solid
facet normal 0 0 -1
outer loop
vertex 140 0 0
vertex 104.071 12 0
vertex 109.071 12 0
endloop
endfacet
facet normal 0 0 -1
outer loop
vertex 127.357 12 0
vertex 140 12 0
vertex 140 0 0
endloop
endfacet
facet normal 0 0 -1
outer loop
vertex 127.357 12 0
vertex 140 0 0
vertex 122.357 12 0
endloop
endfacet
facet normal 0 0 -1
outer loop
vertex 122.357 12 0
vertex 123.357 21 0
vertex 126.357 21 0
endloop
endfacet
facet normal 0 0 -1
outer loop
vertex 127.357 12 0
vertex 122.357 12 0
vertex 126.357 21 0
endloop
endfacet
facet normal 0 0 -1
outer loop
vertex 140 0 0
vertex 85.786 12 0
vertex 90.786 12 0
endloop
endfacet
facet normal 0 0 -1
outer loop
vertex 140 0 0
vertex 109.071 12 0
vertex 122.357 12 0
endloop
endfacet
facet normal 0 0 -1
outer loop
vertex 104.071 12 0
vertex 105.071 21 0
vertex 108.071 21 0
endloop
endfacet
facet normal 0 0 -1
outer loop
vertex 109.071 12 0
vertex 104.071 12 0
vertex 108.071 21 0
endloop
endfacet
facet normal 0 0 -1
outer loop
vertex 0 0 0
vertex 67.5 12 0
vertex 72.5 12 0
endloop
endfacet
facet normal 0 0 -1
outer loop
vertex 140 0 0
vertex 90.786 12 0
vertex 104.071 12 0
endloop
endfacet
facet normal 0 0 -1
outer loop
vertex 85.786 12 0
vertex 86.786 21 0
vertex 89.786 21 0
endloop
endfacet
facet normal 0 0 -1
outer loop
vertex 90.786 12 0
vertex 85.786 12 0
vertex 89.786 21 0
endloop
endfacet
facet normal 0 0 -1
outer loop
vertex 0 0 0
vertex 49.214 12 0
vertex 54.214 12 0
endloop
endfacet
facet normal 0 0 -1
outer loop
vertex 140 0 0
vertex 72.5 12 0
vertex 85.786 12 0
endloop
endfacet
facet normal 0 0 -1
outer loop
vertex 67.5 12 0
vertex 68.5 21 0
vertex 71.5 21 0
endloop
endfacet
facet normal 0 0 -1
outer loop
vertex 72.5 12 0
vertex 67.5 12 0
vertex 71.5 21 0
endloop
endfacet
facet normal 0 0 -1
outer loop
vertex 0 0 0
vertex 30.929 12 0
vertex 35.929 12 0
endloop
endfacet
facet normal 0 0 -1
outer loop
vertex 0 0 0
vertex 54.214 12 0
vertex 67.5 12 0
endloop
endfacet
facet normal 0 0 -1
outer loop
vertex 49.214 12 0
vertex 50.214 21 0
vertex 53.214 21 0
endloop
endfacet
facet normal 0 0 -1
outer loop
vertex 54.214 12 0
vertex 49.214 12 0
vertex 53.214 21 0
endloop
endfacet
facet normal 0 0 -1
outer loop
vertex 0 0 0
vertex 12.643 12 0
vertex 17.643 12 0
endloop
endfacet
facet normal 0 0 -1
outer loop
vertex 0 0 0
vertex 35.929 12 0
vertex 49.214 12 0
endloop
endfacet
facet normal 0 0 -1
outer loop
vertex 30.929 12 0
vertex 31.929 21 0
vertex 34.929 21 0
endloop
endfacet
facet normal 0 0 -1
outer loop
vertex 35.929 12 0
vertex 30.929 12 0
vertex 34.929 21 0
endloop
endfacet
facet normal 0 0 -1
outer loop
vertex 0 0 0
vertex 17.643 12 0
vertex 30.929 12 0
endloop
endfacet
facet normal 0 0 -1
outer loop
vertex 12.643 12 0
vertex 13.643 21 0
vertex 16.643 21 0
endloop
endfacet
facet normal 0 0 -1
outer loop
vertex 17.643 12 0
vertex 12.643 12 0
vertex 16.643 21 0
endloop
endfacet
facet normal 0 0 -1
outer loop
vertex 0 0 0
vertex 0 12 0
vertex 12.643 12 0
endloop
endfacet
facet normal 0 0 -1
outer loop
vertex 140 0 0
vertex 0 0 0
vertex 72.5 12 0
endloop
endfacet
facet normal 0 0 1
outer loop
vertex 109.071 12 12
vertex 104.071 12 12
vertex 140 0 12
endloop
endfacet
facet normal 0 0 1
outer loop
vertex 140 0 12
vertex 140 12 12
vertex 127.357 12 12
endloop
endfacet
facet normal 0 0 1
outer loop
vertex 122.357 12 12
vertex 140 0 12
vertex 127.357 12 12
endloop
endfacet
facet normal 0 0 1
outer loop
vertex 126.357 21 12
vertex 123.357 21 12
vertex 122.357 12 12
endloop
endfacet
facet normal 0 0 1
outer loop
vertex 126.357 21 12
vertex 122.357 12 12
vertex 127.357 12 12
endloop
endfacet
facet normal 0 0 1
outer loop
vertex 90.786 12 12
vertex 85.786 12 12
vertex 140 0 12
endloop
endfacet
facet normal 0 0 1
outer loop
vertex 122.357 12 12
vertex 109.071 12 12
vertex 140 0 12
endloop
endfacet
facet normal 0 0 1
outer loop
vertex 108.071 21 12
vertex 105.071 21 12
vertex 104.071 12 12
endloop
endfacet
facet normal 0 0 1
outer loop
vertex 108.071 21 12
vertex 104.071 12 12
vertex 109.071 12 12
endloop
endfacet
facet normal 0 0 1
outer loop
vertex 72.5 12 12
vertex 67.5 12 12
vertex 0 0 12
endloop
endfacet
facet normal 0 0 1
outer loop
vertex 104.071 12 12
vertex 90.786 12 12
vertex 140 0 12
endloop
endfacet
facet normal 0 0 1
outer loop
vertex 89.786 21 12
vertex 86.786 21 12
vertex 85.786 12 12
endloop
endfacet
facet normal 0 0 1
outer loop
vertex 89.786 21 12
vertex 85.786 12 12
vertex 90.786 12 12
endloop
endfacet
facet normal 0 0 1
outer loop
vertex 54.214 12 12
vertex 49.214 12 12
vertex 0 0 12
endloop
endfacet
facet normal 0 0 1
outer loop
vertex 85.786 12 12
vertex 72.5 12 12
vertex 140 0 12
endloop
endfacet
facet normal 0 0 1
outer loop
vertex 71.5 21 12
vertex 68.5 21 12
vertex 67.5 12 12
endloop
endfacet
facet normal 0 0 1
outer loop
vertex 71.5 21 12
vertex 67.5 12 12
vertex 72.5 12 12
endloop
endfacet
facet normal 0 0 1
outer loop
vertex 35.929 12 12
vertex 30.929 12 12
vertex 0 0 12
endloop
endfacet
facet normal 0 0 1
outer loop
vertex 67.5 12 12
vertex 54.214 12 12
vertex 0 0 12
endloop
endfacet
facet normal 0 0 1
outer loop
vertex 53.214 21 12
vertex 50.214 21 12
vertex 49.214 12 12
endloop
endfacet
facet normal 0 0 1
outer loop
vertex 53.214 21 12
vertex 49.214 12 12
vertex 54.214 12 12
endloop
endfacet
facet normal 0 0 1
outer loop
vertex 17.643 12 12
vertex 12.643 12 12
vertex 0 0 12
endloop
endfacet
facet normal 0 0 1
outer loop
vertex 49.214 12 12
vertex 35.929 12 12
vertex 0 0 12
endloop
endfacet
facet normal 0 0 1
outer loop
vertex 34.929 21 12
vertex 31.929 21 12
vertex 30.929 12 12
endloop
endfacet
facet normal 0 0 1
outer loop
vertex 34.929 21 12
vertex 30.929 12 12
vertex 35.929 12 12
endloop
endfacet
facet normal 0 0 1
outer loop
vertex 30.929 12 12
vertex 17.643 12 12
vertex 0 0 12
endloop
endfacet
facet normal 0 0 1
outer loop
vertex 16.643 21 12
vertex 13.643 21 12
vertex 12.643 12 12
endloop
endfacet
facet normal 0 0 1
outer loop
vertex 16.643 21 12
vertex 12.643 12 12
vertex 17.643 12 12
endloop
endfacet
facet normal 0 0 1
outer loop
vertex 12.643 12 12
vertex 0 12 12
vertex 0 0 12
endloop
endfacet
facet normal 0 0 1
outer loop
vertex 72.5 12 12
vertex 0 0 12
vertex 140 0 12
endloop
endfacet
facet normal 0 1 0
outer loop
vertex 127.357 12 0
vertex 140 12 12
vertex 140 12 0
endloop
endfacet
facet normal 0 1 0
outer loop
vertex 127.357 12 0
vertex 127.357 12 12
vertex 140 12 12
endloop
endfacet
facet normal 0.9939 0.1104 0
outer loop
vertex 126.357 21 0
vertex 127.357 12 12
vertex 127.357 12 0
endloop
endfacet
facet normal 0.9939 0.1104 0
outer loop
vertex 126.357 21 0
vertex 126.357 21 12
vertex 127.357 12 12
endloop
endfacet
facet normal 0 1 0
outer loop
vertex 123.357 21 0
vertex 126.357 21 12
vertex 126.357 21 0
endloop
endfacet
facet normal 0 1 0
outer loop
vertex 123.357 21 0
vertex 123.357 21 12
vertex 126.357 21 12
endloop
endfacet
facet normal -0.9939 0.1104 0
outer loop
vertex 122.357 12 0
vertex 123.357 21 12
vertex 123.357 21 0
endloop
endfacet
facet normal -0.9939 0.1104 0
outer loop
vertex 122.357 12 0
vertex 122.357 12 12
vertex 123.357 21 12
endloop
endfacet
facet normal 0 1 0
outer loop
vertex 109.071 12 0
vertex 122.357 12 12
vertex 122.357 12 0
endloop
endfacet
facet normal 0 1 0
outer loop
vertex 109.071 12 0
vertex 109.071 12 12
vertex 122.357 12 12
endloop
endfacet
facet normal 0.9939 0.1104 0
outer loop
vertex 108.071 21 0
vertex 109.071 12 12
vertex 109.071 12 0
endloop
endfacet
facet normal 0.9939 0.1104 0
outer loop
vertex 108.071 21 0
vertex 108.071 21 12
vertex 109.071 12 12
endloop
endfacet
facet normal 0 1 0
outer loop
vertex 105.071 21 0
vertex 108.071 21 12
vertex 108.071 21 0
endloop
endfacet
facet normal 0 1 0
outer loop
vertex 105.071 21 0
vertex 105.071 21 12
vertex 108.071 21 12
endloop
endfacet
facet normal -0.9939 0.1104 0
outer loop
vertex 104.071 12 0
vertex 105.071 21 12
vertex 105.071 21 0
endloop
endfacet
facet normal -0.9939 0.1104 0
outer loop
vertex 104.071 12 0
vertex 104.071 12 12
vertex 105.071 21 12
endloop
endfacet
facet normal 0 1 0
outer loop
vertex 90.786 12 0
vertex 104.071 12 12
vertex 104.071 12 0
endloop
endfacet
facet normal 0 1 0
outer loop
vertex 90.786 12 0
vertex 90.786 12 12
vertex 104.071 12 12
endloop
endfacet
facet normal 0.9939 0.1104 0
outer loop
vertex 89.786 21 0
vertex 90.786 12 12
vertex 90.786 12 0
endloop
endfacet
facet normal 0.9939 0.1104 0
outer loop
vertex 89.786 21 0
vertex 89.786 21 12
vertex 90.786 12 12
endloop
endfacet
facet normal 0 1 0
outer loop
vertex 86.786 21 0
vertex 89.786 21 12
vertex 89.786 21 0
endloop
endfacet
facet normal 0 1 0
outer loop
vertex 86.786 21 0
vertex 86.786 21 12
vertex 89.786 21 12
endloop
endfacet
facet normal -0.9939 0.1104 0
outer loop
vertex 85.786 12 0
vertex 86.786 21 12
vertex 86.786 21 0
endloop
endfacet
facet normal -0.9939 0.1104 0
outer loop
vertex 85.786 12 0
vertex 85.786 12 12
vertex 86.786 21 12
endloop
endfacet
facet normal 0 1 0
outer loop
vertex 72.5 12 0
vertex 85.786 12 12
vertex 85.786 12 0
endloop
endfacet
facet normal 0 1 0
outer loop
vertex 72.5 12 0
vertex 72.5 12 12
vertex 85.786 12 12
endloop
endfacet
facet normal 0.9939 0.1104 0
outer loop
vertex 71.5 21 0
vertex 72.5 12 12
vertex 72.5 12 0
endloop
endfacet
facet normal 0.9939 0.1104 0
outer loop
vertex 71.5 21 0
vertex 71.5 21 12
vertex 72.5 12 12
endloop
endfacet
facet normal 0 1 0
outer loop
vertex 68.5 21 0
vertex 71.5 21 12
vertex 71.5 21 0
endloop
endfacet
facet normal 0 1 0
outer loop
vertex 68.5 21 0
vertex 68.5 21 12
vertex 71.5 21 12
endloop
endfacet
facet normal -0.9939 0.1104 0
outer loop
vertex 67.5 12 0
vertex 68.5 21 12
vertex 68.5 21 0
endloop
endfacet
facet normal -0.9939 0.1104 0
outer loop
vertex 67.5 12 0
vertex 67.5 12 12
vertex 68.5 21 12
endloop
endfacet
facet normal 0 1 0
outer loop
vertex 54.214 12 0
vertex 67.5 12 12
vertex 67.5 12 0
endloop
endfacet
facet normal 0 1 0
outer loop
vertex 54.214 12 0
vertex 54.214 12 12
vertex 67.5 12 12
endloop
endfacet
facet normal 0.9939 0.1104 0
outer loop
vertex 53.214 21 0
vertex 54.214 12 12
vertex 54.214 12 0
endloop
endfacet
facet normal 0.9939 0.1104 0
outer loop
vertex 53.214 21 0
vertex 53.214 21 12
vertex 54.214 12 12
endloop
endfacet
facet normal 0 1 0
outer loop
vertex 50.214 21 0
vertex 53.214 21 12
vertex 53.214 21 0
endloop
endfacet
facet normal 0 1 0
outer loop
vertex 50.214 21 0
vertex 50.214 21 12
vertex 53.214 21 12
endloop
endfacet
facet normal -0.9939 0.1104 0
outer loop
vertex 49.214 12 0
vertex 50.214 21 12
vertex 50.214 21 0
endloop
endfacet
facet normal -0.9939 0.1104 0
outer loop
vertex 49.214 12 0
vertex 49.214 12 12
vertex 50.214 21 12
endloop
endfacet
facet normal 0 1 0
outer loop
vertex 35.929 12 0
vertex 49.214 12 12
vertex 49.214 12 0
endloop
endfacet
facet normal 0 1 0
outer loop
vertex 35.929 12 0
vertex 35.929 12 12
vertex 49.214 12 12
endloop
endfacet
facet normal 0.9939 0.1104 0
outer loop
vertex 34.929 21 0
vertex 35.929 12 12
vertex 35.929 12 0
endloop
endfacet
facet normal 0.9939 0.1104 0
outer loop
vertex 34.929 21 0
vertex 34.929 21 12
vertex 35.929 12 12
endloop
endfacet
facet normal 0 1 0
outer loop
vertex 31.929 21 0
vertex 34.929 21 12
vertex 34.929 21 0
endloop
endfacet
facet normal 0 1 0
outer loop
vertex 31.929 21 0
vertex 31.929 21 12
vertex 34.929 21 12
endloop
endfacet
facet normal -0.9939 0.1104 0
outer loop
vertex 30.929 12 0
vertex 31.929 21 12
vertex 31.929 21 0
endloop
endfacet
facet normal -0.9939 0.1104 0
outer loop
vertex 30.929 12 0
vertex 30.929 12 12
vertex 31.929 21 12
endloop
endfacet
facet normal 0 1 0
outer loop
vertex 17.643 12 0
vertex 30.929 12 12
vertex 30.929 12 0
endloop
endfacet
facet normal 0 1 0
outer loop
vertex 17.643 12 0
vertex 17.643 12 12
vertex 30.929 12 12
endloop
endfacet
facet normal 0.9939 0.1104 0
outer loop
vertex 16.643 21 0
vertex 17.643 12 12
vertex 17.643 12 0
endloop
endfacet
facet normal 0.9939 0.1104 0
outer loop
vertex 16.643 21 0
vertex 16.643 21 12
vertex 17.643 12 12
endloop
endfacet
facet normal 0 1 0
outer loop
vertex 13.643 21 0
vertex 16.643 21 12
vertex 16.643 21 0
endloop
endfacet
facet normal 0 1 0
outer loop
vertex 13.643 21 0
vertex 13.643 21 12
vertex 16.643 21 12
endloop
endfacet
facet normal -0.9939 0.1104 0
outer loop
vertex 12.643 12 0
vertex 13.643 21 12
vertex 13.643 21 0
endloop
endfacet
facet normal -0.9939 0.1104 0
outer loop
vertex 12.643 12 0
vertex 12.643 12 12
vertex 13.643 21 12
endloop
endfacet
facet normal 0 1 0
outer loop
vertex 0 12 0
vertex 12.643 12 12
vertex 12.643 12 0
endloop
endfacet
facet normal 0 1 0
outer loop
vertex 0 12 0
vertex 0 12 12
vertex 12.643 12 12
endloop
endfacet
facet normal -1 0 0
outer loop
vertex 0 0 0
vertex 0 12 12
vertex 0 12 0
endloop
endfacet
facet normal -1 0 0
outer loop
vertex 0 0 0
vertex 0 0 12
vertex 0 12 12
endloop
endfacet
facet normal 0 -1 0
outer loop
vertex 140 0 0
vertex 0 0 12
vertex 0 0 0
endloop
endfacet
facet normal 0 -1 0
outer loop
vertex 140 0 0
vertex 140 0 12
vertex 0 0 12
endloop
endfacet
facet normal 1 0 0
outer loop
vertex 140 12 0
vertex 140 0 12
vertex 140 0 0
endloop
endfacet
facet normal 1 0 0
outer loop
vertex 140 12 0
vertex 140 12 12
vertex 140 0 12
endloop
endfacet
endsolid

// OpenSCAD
$fn = 32;

// ----------------------------------------------------------------------
// Gear rack: 7 teeth on a 140 mm bar, pitch 18.29 mm
// ----------------------------------------------------------------------

// --- parameters (mm) ---
profile_height = 12;      // extrusion height
profile_points = 32;      // points of the closed outline

profile = [[0, 0], [140, 0], [140, 12], [127.357, 12], [126.357, 21], [123.357, 21], [122.357, 12], [109.071, 12], [108.071, 21], [105.071, 21], [104.071, 12], [90.786, 12], [89.786, 21], [86.786, 21], [85.786, 12], [72.5, 12], [71.5, 21], [68.5, 21], [67.5, 12], [54.214, 12], [53.214, 21], [50.214, 21], [49.214, 12], [35.929, 12], [34.929, 21], [31.929, 21], [30.929, 12], [17.643, 12], [16.643, 21], [13.643, 21], [12.643, 12], [0, 12]];  // single closed polygon, 32 points, counter clockwise

// --- the one profile operation ---
linear_extrude(height = profile_height) polygon(points = profile);
